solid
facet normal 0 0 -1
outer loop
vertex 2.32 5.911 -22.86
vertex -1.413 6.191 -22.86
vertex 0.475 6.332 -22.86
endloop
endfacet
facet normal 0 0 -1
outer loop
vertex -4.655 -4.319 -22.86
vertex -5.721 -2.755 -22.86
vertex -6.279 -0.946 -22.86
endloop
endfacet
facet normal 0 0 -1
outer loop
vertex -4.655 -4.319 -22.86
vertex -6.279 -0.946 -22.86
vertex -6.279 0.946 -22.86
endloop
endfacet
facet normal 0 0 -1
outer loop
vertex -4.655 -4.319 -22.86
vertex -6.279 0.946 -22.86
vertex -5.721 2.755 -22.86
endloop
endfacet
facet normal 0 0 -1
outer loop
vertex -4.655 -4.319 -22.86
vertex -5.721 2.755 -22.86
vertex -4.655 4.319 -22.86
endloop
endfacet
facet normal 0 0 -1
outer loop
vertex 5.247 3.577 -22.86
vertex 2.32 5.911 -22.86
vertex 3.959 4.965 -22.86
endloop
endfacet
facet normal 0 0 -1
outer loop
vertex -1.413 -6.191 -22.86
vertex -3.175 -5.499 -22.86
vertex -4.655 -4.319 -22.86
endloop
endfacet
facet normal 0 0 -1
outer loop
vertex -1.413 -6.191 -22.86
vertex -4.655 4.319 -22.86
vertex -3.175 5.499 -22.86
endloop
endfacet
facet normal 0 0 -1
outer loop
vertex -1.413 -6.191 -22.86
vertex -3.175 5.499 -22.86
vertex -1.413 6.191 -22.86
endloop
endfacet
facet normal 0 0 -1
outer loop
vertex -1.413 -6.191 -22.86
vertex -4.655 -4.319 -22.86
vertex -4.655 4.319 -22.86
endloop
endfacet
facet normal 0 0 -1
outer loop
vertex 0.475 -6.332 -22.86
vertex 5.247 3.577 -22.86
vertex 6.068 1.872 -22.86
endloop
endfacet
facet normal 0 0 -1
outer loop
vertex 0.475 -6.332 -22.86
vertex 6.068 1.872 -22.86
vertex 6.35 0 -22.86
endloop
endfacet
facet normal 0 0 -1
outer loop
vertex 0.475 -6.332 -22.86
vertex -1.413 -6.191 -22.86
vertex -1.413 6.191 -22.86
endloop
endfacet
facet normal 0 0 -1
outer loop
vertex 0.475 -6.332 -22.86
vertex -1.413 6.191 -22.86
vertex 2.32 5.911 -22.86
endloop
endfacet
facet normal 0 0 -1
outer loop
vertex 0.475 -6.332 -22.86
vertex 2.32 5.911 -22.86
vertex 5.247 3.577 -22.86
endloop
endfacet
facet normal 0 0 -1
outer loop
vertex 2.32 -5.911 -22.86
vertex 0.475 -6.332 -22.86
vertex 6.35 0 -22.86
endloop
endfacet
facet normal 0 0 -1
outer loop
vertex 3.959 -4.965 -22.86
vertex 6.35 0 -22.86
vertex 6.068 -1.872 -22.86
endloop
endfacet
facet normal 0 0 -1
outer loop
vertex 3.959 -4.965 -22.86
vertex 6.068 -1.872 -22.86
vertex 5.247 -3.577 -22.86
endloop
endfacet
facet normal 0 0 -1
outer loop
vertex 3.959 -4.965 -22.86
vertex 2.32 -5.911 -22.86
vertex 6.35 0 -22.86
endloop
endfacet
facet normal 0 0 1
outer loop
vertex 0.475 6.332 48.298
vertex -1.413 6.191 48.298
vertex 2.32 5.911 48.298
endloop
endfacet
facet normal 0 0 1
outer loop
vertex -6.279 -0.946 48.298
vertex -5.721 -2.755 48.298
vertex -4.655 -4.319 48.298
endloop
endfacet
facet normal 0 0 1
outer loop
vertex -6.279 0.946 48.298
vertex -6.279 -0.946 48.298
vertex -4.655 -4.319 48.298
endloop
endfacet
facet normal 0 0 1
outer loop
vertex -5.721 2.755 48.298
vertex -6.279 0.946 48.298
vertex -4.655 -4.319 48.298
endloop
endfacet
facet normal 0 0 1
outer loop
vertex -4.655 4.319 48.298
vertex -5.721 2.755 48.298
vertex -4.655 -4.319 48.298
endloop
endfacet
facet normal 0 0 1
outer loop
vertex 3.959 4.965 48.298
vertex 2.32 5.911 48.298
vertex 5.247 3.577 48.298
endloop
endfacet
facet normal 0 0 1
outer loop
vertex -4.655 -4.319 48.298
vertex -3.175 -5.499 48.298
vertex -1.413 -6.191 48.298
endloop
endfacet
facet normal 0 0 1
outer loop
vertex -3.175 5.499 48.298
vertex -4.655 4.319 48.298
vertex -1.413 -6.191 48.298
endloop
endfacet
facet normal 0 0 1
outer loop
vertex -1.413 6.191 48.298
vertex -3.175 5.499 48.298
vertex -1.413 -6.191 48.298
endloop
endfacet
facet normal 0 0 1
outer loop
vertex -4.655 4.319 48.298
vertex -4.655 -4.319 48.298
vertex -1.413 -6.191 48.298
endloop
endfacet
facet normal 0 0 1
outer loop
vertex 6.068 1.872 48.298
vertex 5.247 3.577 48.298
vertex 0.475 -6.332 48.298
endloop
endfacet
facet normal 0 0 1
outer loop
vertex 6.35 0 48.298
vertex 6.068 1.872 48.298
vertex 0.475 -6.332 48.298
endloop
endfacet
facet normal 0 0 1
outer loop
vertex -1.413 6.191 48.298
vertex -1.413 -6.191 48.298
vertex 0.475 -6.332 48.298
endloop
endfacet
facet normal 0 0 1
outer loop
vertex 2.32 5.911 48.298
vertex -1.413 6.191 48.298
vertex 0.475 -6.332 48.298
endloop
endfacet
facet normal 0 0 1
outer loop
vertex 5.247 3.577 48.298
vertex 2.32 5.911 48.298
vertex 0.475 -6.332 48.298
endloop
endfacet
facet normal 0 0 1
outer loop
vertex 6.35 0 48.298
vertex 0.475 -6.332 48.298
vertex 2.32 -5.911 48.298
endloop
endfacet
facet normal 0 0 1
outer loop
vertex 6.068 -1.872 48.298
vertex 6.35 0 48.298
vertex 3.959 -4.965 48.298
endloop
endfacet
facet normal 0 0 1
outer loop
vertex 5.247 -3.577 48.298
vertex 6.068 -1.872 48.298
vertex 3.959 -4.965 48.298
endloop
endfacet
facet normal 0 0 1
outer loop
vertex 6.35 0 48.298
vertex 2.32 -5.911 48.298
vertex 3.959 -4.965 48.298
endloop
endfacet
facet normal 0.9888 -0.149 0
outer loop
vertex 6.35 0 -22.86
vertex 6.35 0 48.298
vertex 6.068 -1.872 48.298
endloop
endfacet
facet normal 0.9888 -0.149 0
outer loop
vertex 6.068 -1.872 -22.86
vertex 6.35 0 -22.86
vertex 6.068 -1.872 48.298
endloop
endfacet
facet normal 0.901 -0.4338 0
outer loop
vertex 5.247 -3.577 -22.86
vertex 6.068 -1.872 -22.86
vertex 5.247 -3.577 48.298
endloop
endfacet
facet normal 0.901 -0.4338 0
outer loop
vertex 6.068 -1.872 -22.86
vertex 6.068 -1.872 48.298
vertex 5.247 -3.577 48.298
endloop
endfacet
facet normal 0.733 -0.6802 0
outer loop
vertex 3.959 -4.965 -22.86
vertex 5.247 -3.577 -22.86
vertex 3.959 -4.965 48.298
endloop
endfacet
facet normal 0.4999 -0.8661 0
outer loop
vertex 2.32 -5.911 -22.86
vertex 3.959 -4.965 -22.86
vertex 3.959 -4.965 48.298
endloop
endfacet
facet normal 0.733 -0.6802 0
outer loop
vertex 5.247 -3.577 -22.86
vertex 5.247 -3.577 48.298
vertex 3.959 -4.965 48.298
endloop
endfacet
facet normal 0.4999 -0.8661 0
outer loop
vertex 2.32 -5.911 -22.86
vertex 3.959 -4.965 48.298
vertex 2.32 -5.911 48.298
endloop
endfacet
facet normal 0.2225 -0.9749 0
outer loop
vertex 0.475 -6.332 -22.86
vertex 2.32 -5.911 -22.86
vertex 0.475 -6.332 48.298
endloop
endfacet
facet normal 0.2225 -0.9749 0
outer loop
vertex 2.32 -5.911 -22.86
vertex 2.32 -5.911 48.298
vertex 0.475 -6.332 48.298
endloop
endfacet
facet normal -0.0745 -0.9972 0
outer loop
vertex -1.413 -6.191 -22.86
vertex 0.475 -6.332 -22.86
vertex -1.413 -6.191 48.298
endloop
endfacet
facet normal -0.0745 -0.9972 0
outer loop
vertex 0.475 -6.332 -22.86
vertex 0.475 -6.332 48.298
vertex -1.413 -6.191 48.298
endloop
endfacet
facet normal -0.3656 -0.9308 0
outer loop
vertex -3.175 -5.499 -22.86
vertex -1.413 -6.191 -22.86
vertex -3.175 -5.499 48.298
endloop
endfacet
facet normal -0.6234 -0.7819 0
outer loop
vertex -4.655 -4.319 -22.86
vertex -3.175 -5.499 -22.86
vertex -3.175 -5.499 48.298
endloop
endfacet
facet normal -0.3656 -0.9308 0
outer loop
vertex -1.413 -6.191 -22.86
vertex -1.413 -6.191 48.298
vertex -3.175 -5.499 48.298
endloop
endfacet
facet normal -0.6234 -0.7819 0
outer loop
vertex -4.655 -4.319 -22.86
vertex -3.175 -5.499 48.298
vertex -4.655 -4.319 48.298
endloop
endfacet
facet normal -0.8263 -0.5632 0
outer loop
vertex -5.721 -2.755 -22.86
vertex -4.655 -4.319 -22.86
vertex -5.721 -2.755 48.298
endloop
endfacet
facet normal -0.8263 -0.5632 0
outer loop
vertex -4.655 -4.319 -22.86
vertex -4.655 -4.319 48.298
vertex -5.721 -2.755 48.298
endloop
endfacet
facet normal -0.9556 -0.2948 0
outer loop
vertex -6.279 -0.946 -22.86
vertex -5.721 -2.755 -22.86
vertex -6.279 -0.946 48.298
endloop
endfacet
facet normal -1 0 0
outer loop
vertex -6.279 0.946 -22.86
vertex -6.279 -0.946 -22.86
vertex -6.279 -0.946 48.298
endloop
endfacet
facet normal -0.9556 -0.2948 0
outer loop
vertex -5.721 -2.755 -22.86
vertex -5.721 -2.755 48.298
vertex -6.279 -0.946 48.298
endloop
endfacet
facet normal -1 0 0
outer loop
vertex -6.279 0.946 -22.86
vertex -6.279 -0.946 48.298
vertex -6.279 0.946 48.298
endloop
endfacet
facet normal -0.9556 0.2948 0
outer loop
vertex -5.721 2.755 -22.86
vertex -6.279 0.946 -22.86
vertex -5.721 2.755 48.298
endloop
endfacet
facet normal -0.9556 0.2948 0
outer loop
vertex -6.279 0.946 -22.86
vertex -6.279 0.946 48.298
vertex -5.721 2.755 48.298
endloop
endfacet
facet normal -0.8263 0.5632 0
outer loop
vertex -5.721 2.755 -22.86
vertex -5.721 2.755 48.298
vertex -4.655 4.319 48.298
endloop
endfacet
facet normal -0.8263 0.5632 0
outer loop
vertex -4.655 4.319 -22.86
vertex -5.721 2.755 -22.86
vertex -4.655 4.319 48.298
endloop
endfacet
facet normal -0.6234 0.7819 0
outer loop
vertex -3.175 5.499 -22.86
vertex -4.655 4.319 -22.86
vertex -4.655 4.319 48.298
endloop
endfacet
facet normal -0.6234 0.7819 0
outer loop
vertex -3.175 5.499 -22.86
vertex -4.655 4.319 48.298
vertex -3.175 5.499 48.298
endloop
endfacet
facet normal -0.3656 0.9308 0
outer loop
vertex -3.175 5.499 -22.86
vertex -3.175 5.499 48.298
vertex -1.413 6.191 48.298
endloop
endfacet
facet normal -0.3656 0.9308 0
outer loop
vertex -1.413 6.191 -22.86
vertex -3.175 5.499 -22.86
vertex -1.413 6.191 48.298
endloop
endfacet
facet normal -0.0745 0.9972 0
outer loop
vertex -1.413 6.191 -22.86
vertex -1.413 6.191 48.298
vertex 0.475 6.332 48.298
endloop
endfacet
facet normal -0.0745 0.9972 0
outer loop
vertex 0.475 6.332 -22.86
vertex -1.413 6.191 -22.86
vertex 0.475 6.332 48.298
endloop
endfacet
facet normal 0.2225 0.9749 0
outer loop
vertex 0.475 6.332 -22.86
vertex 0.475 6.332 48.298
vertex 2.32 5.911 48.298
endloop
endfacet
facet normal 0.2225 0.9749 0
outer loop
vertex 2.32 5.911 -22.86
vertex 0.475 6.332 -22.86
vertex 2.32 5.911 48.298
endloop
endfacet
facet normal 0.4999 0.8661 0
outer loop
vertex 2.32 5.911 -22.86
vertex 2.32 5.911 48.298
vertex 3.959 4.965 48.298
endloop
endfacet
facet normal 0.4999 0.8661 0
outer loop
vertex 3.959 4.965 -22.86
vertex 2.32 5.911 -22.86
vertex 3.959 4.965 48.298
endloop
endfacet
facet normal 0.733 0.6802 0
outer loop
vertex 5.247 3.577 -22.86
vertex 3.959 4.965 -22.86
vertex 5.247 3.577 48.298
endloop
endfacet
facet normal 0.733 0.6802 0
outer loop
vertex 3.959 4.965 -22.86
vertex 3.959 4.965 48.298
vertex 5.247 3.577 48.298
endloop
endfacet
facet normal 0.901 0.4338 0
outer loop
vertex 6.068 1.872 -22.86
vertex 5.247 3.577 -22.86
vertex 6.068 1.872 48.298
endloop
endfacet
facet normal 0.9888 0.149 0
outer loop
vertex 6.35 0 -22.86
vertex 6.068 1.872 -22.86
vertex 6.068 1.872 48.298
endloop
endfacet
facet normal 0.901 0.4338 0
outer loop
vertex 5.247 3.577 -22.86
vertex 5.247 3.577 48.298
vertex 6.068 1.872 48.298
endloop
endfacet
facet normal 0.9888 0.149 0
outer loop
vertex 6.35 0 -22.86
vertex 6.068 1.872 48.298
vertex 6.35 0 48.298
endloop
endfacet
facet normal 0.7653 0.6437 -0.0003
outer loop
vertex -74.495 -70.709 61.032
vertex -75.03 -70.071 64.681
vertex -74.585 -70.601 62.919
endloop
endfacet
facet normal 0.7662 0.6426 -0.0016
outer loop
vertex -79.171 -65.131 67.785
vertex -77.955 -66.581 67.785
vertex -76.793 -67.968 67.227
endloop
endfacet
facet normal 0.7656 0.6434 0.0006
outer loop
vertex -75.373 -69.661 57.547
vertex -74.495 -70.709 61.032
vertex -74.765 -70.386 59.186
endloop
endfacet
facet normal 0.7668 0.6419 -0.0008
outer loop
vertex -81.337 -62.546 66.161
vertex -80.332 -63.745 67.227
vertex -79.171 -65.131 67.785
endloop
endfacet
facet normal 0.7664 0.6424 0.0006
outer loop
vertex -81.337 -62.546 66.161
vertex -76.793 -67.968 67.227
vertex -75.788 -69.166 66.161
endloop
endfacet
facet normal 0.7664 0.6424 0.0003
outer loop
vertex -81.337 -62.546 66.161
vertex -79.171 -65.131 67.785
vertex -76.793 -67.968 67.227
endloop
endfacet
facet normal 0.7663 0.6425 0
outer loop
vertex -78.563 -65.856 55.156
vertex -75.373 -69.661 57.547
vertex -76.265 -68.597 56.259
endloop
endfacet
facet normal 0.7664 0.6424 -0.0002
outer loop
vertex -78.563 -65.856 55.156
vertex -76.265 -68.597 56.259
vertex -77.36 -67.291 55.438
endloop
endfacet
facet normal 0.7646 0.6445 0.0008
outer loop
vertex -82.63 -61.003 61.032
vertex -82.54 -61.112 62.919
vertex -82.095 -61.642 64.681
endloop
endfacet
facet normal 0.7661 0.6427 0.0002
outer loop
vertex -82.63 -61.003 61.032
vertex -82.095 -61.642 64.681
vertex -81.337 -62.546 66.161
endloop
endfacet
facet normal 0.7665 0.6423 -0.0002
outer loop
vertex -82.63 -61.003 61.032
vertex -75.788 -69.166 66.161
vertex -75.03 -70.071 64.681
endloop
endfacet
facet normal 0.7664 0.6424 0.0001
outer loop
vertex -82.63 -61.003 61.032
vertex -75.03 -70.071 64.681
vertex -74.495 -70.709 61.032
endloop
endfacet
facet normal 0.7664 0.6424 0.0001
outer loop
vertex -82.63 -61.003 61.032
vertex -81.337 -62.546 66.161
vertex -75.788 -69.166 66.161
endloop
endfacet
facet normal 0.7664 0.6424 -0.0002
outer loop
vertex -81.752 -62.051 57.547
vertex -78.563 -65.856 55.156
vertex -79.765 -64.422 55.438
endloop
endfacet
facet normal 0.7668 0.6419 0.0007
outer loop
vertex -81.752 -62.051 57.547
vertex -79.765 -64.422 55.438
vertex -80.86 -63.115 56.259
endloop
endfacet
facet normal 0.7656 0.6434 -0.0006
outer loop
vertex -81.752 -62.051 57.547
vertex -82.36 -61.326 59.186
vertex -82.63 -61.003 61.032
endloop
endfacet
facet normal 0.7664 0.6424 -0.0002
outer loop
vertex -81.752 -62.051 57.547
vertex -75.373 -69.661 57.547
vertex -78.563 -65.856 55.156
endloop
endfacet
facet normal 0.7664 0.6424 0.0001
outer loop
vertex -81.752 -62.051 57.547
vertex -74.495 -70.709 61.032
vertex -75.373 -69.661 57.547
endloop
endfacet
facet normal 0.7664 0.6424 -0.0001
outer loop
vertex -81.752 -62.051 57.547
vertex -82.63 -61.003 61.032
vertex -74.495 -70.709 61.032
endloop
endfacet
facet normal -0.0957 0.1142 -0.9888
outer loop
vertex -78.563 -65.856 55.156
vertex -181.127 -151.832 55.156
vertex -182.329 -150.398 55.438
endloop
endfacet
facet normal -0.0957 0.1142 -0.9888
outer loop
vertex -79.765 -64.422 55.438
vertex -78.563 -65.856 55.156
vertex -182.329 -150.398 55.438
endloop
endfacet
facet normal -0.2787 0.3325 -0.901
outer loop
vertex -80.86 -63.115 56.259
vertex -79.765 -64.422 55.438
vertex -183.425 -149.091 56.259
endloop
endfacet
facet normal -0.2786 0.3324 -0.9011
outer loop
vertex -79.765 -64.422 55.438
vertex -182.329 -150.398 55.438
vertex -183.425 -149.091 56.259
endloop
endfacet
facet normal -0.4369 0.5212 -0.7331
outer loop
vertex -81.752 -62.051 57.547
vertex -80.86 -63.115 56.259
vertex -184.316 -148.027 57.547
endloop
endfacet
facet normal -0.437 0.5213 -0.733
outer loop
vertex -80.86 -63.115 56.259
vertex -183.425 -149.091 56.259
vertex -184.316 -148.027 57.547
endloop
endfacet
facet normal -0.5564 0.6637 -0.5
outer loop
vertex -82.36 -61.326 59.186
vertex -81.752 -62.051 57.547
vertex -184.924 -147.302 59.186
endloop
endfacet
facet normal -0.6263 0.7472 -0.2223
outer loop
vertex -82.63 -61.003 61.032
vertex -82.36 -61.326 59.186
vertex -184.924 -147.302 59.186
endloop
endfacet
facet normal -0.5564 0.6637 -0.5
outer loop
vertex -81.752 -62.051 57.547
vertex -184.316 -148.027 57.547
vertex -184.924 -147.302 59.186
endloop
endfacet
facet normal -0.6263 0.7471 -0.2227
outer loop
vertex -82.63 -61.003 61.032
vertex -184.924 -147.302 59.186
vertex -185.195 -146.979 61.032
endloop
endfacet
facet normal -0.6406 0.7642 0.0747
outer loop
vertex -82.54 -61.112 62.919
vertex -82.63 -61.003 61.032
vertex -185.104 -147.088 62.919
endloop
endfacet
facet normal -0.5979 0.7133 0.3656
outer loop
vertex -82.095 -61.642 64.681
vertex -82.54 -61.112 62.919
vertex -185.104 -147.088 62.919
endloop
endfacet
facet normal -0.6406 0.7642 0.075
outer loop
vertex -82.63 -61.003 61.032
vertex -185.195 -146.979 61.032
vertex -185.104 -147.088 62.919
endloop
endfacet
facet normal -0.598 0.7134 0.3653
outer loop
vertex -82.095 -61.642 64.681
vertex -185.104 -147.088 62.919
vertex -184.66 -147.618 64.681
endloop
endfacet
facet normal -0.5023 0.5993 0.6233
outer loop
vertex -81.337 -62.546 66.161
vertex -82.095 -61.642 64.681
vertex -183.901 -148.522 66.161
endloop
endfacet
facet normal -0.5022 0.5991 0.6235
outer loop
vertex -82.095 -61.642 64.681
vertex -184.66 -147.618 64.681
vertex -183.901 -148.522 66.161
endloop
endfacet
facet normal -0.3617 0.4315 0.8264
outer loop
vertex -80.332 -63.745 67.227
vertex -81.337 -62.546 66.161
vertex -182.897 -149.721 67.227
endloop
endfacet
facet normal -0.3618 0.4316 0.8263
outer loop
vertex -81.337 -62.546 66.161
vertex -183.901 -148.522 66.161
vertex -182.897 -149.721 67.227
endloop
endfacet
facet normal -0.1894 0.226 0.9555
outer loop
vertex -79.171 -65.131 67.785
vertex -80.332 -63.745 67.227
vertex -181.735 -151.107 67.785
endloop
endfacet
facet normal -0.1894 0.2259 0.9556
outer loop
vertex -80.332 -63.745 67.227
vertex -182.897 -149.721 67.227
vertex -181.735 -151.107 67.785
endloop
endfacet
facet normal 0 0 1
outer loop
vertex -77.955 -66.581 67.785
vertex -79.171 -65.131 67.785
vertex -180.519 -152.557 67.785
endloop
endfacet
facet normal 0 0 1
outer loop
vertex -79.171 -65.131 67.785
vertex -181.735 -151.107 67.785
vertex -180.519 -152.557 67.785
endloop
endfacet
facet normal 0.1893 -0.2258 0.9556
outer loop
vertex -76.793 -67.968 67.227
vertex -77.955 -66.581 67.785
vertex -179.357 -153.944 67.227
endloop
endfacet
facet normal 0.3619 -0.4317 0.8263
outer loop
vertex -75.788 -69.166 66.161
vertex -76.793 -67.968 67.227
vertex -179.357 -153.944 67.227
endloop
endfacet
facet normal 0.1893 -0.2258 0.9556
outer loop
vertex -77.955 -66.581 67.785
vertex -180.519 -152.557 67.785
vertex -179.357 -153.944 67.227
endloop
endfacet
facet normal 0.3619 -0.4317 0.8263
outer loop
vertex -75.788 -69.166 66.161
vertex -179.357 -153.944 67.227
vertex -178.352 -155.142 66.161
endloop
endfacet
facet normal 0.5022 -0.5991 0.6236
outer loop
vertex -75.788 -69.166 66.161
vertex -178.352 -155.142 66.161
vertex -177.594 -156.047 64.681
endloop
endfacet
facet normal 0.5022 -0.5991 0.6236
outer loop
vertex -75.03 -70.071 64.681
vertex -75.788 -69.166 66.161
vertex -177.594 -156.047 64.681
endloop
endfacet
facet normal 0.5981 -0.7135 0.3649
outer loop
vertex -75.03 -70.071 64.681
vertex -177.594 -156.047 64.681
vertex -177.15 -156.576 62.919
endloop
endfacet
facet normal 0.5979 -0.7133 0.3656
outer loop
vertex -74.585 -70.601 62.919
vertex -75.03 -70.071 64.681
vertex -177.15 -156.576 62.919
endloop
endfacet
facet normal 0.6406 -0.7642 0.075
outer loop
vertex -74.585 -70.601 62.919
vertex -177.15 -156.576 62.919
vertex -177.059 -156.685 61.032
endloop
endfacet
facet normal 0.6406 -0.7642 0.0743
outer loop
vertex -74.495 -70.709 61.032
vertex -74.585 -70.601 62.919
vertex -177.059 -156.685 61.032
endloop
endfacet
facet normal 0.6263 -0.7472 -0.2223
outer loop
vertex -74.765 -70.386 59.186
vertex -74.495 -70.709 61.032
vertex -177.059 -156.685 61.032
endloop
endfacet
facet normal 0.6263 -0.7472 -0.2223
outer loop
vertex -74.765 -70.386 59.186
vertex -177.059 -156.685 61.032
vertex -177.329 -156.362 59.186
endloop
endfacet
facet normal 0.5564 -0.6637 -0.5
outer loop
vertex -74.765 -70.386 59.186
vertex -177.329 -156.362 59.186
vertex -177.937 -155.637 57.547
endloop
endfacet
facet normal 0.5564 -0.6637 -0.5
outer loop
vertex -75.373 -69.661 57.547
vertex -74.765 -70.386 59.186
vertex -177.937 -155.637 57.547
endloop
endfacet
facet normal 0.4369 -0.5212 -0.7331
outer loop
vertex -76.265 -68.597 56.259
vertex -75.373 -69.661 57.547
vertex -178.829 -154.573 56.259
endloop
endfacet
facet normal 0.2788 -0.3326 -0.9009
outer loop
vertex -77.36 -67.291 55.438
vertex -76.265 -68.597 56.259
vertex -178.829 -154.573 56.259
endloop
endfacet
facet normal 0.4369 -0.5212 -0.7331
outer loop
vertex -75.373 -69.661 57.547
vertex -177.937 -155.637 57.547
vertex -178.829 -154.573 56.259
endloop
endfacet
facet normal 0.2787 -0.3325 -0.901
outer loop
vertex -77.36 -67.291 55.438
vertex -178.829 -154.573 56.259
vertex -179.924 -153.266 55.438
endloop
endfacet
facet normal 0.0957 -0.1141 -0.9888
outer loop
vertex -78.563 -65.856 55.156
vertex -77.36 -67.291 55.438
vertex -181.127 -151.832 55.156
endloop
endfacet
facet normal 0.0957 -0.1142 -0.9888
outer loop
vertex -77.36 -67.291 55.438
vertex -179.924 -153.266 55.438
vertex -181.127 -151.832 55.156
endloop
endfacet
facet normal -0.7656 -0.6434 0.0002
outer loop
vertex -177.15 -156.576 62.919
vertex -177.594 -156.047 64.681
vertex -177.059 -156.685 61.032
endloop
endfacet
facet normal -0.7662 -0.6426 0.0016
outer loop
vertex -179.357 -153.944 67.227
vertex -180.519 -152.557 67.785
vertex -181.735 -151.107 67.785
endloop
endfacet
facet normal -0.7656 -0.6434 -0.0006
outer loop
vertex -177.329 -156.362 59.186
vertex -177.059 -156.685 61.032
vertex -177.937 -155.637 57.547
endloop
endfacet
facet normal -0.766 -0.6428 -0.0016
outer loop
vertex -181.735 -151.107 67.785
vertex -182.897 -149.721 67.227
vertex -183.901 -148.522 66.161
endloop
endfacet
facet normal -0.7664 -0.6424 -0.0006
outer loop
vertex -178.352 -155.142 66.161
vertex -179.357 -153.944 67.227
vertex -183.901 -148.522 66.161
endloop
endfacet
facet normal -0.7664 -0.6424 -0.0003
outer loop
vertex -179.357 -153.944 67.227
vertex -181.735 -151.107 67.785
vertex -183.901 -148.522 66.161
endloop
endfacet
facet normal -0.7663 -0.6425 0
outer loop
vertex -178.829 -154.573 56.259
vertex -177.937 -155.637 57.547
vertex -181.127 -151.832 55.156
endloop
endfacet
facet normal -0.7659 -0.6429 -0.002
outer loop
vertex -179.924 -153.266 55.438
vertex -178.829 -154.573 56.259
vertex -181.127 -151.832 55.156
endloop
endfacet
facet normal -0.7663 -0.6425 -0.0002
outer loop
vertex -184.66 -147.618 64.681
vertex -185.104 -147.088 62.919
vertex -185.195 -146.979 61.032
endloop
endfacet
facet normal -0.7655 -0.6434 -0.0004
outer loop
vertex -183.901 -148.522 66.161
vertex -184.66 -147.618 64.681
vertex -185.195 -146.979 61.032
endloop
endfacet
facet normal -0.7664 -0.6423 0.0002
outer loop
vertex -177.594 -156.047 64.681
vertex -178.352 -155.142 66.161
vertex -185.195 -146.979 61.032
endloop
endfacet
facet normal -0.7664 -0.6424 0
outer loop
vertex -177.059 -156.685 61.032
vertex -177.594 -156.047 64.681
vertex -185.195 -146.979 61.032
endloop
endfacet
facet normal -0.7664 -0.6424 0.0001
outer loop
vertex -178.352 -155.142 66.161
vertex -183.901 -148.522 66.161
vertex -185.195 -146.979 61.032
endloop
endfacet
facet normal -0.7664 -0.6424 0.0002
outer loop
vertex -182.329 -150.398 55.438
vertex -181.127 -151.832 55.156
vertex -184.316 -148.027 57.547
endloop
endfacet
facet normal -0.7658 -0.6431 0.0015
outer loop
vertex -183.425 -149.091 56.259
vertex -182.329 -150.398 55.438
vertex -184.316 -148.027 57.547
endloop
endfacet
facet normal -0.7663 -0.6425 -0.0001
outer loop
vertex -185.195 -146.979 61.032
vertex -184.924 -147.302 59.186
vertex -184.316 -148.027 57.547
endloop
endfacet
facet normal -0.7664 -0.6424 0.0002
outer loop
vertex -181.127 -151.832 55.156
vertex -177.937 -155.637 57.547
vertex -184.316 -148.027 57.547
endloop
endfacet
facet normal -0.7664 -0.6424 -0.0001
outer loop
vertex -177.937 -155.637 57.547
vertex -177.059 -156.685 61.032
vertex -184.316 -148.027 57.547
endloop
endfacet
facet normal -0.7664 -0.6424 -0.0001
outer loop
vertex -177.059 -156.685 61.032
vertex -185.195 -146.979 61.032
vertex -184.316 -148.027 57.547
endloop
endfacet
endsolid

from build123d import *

# Parameters (mm, degrees)
BOSS_EXTRUDE1_OUTLINE_R = 6.35
BOSS_EXTRUDE1_DEPTH     = 133.833102677
SKETCH3_R               = 6.35
BOSS_EXTRUDE2_DEPTH     = 71.1581


# Read off the part's stored shape, not the designer's step: Boss-Extrude1
with BuildPart() as part:
    # Boss-Extrude1 outline → Boss-Extrude1 (new body)
    with BuildSketch(Plane(origin=(-181.126806004, -151.8320933, 0), x_dir=(0, 0, -1), z_dir=(0.7663596576395599, 0.6424117644802098, 0))):
        with Locations((-61.5061, 0)):
            Circle(BOSS_EXTRUDE1_OUTLINE_R)
    extrude(amount=BOSS_EXTRUDE1_DEPTH)


with BuildPart() as body_2:
    # Sketch3 → Boss-Extrude2 (new body)
    with BuildSketch(Plane(origin=(0, 0, 48.2981), x_dir=(-1, 0, 0), z_dir=(0, 0, -1))):
        with Locations(Location((0, 0, 0), (0, 0, 180))):
            Circle(SKETCH3_R)
    extrude(amount=BOSS_EXTRUDE2_DEPTH)


solid = Compound([part.part, body_2.part])
